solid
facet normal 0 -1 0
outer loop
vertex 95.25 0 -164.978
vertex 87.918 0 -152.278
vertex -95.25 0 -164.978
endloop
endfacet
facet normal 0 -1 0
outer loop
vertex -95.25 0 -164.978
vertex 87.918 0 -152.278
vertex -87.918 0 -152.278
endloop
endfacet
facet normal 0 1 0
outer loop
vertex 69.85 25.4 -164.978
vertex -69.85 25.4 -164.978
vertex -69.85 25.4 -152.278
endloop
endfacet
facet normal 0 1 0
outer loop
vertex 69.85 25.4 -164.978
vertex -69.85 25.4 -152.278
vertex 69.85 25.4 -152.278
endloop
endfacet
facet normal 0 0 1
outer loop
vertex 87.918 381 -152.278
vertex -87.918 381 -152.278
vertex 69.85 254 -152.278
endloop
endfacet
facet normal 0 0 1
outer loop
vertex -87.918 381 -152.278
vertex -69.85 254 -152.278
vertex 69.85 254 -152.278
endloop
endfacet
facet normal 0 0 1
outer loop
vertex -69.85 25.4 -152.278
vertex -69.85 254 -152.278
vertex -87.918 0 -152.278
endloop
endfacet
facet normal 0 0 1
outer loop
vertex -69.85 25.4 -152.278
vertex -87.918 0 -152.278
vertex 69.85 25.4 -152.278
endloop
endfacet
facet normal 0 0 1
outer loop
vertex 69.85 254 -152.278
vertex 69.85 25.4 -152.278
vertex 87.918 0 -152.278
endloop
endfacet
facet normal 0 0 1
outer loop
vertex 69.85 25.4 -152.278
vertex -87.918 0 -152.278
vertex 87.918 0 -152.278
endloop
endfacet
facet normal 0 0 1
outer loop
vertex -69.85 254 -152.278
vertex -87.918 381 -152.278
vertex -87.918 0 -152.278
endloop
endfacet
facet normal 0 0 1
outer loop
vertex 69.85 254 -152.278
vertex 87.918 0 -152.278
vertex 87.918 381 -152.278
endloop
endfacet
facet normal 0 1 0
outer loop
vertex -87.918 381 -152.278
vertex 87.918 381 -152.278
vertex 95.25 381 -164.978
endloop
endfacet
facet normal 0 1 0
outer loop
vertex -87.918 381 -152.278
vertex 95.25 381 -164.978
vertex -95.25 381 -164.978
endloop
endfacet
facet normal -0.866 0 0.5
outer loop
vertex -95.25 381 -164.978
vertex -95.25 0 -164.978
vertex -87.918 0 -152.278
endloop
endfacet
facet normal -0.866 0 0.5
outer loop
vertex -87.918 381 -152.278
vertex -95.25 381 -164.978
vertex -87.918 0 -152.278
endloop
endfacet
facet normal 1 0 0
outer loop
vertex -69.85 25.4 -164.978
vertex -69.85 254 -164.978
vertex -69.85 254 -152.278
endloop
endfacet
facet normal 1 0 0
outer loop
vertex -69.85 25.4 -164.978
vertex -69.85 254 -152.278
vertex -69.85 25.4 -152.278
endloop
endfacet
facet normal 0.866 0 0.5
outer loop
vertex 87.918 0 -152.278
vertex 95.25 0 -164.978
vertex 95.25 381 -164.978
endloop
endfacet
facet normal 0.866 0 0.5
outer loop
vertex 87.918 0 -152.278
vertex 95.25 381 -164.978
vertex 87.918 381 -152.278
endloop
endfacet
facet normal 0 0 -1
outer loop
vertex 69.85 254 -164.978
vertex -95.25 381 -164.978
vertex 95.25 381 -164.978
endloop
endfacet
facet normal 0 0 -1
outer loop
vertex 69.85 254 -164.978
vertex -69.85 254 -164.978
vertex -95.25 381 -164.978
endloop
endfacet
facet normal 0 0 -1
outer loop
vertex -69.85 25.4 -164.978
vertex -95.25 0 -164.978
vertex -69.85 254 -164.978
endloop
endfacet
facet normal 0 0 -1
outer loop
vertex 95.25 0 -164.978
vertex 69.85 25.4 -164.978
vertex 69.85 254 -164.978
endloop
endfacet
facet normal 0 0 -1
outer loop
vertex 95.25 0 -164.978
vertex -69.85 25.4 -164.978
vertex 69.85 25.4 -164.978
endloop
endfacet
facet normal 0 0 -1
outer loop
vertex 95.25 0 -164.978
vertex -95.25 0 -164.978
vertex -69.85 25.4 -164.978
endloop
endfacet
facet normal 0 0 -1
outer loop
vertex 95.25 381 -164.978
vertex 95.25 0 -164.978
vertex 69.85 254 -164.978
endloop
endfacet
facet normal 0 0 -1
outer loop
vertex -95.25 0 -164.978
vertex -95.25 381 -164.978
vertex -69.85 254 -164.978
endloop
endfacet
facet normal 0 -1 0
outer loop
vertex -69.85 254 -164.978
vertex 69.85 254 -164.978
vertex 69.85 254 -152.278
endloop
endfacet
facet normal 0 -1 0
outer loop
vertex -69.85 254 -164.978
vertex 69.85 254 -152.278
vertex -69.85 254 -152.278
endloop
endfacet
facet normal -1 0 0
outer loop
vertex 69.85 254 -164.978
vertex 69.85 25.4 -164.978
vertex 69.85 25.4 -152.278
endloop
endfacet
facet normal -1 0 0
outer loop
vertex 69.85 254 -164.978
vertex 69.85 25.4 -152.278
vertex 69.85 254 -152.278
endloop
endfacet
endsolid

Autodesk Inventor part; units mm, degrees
sketch "Sketch1" plane through (0, 0, 0) normal (0, 1, 0) x (-1, 0, 0)
  line L0 (95.25, -164.9778) -> (-95.25, -164.9778)
  line L1 (87.9177, -152.2778) -> (-87.9177, -152.2778)
  line L2 (95.25, -164.9778) -> (87.9177, -152.2778)
  line L3 (-95.25, -164.9778) -> (-87.9177, -152.2778)
  point P0 (0, 0)
  point P1 (0, 0)
  point P2 (0, 0)
  dimension "d0" = 190.5
  dimension "d1" = 12.7
  dimension "d3" = 120
  dimension "d4" = 0
extrude "Extrusion1" add sketch "Sketch1" along normal blind 381
sketch "Sketch2" plane through (95.25, 0, -164.9778) normal (0, 0, -1) x (-1, 0, 0)
  line L0 (25.4, 254) -> (165.1, 254)
  line L1 (165.1, 254) -> (165.1, 25.4)
  line L2 (165.1, 25.4) -> (25.4, 25.4)
  line L3 (25.4, 25.4) -> (25.4, 254)
  line L4 (0, 0) -> (0, 381) projected
  point P0 (95.25, 0)
  dimension "d7" = 139.7
  dimension "d8" = 25.4
  dimension "d9" = 25.4
  dimension "d10" = 228.6
extrude "Extrusion2" cut sketch "Sketch2" against normal up to next
properties part number "side_w_door"
